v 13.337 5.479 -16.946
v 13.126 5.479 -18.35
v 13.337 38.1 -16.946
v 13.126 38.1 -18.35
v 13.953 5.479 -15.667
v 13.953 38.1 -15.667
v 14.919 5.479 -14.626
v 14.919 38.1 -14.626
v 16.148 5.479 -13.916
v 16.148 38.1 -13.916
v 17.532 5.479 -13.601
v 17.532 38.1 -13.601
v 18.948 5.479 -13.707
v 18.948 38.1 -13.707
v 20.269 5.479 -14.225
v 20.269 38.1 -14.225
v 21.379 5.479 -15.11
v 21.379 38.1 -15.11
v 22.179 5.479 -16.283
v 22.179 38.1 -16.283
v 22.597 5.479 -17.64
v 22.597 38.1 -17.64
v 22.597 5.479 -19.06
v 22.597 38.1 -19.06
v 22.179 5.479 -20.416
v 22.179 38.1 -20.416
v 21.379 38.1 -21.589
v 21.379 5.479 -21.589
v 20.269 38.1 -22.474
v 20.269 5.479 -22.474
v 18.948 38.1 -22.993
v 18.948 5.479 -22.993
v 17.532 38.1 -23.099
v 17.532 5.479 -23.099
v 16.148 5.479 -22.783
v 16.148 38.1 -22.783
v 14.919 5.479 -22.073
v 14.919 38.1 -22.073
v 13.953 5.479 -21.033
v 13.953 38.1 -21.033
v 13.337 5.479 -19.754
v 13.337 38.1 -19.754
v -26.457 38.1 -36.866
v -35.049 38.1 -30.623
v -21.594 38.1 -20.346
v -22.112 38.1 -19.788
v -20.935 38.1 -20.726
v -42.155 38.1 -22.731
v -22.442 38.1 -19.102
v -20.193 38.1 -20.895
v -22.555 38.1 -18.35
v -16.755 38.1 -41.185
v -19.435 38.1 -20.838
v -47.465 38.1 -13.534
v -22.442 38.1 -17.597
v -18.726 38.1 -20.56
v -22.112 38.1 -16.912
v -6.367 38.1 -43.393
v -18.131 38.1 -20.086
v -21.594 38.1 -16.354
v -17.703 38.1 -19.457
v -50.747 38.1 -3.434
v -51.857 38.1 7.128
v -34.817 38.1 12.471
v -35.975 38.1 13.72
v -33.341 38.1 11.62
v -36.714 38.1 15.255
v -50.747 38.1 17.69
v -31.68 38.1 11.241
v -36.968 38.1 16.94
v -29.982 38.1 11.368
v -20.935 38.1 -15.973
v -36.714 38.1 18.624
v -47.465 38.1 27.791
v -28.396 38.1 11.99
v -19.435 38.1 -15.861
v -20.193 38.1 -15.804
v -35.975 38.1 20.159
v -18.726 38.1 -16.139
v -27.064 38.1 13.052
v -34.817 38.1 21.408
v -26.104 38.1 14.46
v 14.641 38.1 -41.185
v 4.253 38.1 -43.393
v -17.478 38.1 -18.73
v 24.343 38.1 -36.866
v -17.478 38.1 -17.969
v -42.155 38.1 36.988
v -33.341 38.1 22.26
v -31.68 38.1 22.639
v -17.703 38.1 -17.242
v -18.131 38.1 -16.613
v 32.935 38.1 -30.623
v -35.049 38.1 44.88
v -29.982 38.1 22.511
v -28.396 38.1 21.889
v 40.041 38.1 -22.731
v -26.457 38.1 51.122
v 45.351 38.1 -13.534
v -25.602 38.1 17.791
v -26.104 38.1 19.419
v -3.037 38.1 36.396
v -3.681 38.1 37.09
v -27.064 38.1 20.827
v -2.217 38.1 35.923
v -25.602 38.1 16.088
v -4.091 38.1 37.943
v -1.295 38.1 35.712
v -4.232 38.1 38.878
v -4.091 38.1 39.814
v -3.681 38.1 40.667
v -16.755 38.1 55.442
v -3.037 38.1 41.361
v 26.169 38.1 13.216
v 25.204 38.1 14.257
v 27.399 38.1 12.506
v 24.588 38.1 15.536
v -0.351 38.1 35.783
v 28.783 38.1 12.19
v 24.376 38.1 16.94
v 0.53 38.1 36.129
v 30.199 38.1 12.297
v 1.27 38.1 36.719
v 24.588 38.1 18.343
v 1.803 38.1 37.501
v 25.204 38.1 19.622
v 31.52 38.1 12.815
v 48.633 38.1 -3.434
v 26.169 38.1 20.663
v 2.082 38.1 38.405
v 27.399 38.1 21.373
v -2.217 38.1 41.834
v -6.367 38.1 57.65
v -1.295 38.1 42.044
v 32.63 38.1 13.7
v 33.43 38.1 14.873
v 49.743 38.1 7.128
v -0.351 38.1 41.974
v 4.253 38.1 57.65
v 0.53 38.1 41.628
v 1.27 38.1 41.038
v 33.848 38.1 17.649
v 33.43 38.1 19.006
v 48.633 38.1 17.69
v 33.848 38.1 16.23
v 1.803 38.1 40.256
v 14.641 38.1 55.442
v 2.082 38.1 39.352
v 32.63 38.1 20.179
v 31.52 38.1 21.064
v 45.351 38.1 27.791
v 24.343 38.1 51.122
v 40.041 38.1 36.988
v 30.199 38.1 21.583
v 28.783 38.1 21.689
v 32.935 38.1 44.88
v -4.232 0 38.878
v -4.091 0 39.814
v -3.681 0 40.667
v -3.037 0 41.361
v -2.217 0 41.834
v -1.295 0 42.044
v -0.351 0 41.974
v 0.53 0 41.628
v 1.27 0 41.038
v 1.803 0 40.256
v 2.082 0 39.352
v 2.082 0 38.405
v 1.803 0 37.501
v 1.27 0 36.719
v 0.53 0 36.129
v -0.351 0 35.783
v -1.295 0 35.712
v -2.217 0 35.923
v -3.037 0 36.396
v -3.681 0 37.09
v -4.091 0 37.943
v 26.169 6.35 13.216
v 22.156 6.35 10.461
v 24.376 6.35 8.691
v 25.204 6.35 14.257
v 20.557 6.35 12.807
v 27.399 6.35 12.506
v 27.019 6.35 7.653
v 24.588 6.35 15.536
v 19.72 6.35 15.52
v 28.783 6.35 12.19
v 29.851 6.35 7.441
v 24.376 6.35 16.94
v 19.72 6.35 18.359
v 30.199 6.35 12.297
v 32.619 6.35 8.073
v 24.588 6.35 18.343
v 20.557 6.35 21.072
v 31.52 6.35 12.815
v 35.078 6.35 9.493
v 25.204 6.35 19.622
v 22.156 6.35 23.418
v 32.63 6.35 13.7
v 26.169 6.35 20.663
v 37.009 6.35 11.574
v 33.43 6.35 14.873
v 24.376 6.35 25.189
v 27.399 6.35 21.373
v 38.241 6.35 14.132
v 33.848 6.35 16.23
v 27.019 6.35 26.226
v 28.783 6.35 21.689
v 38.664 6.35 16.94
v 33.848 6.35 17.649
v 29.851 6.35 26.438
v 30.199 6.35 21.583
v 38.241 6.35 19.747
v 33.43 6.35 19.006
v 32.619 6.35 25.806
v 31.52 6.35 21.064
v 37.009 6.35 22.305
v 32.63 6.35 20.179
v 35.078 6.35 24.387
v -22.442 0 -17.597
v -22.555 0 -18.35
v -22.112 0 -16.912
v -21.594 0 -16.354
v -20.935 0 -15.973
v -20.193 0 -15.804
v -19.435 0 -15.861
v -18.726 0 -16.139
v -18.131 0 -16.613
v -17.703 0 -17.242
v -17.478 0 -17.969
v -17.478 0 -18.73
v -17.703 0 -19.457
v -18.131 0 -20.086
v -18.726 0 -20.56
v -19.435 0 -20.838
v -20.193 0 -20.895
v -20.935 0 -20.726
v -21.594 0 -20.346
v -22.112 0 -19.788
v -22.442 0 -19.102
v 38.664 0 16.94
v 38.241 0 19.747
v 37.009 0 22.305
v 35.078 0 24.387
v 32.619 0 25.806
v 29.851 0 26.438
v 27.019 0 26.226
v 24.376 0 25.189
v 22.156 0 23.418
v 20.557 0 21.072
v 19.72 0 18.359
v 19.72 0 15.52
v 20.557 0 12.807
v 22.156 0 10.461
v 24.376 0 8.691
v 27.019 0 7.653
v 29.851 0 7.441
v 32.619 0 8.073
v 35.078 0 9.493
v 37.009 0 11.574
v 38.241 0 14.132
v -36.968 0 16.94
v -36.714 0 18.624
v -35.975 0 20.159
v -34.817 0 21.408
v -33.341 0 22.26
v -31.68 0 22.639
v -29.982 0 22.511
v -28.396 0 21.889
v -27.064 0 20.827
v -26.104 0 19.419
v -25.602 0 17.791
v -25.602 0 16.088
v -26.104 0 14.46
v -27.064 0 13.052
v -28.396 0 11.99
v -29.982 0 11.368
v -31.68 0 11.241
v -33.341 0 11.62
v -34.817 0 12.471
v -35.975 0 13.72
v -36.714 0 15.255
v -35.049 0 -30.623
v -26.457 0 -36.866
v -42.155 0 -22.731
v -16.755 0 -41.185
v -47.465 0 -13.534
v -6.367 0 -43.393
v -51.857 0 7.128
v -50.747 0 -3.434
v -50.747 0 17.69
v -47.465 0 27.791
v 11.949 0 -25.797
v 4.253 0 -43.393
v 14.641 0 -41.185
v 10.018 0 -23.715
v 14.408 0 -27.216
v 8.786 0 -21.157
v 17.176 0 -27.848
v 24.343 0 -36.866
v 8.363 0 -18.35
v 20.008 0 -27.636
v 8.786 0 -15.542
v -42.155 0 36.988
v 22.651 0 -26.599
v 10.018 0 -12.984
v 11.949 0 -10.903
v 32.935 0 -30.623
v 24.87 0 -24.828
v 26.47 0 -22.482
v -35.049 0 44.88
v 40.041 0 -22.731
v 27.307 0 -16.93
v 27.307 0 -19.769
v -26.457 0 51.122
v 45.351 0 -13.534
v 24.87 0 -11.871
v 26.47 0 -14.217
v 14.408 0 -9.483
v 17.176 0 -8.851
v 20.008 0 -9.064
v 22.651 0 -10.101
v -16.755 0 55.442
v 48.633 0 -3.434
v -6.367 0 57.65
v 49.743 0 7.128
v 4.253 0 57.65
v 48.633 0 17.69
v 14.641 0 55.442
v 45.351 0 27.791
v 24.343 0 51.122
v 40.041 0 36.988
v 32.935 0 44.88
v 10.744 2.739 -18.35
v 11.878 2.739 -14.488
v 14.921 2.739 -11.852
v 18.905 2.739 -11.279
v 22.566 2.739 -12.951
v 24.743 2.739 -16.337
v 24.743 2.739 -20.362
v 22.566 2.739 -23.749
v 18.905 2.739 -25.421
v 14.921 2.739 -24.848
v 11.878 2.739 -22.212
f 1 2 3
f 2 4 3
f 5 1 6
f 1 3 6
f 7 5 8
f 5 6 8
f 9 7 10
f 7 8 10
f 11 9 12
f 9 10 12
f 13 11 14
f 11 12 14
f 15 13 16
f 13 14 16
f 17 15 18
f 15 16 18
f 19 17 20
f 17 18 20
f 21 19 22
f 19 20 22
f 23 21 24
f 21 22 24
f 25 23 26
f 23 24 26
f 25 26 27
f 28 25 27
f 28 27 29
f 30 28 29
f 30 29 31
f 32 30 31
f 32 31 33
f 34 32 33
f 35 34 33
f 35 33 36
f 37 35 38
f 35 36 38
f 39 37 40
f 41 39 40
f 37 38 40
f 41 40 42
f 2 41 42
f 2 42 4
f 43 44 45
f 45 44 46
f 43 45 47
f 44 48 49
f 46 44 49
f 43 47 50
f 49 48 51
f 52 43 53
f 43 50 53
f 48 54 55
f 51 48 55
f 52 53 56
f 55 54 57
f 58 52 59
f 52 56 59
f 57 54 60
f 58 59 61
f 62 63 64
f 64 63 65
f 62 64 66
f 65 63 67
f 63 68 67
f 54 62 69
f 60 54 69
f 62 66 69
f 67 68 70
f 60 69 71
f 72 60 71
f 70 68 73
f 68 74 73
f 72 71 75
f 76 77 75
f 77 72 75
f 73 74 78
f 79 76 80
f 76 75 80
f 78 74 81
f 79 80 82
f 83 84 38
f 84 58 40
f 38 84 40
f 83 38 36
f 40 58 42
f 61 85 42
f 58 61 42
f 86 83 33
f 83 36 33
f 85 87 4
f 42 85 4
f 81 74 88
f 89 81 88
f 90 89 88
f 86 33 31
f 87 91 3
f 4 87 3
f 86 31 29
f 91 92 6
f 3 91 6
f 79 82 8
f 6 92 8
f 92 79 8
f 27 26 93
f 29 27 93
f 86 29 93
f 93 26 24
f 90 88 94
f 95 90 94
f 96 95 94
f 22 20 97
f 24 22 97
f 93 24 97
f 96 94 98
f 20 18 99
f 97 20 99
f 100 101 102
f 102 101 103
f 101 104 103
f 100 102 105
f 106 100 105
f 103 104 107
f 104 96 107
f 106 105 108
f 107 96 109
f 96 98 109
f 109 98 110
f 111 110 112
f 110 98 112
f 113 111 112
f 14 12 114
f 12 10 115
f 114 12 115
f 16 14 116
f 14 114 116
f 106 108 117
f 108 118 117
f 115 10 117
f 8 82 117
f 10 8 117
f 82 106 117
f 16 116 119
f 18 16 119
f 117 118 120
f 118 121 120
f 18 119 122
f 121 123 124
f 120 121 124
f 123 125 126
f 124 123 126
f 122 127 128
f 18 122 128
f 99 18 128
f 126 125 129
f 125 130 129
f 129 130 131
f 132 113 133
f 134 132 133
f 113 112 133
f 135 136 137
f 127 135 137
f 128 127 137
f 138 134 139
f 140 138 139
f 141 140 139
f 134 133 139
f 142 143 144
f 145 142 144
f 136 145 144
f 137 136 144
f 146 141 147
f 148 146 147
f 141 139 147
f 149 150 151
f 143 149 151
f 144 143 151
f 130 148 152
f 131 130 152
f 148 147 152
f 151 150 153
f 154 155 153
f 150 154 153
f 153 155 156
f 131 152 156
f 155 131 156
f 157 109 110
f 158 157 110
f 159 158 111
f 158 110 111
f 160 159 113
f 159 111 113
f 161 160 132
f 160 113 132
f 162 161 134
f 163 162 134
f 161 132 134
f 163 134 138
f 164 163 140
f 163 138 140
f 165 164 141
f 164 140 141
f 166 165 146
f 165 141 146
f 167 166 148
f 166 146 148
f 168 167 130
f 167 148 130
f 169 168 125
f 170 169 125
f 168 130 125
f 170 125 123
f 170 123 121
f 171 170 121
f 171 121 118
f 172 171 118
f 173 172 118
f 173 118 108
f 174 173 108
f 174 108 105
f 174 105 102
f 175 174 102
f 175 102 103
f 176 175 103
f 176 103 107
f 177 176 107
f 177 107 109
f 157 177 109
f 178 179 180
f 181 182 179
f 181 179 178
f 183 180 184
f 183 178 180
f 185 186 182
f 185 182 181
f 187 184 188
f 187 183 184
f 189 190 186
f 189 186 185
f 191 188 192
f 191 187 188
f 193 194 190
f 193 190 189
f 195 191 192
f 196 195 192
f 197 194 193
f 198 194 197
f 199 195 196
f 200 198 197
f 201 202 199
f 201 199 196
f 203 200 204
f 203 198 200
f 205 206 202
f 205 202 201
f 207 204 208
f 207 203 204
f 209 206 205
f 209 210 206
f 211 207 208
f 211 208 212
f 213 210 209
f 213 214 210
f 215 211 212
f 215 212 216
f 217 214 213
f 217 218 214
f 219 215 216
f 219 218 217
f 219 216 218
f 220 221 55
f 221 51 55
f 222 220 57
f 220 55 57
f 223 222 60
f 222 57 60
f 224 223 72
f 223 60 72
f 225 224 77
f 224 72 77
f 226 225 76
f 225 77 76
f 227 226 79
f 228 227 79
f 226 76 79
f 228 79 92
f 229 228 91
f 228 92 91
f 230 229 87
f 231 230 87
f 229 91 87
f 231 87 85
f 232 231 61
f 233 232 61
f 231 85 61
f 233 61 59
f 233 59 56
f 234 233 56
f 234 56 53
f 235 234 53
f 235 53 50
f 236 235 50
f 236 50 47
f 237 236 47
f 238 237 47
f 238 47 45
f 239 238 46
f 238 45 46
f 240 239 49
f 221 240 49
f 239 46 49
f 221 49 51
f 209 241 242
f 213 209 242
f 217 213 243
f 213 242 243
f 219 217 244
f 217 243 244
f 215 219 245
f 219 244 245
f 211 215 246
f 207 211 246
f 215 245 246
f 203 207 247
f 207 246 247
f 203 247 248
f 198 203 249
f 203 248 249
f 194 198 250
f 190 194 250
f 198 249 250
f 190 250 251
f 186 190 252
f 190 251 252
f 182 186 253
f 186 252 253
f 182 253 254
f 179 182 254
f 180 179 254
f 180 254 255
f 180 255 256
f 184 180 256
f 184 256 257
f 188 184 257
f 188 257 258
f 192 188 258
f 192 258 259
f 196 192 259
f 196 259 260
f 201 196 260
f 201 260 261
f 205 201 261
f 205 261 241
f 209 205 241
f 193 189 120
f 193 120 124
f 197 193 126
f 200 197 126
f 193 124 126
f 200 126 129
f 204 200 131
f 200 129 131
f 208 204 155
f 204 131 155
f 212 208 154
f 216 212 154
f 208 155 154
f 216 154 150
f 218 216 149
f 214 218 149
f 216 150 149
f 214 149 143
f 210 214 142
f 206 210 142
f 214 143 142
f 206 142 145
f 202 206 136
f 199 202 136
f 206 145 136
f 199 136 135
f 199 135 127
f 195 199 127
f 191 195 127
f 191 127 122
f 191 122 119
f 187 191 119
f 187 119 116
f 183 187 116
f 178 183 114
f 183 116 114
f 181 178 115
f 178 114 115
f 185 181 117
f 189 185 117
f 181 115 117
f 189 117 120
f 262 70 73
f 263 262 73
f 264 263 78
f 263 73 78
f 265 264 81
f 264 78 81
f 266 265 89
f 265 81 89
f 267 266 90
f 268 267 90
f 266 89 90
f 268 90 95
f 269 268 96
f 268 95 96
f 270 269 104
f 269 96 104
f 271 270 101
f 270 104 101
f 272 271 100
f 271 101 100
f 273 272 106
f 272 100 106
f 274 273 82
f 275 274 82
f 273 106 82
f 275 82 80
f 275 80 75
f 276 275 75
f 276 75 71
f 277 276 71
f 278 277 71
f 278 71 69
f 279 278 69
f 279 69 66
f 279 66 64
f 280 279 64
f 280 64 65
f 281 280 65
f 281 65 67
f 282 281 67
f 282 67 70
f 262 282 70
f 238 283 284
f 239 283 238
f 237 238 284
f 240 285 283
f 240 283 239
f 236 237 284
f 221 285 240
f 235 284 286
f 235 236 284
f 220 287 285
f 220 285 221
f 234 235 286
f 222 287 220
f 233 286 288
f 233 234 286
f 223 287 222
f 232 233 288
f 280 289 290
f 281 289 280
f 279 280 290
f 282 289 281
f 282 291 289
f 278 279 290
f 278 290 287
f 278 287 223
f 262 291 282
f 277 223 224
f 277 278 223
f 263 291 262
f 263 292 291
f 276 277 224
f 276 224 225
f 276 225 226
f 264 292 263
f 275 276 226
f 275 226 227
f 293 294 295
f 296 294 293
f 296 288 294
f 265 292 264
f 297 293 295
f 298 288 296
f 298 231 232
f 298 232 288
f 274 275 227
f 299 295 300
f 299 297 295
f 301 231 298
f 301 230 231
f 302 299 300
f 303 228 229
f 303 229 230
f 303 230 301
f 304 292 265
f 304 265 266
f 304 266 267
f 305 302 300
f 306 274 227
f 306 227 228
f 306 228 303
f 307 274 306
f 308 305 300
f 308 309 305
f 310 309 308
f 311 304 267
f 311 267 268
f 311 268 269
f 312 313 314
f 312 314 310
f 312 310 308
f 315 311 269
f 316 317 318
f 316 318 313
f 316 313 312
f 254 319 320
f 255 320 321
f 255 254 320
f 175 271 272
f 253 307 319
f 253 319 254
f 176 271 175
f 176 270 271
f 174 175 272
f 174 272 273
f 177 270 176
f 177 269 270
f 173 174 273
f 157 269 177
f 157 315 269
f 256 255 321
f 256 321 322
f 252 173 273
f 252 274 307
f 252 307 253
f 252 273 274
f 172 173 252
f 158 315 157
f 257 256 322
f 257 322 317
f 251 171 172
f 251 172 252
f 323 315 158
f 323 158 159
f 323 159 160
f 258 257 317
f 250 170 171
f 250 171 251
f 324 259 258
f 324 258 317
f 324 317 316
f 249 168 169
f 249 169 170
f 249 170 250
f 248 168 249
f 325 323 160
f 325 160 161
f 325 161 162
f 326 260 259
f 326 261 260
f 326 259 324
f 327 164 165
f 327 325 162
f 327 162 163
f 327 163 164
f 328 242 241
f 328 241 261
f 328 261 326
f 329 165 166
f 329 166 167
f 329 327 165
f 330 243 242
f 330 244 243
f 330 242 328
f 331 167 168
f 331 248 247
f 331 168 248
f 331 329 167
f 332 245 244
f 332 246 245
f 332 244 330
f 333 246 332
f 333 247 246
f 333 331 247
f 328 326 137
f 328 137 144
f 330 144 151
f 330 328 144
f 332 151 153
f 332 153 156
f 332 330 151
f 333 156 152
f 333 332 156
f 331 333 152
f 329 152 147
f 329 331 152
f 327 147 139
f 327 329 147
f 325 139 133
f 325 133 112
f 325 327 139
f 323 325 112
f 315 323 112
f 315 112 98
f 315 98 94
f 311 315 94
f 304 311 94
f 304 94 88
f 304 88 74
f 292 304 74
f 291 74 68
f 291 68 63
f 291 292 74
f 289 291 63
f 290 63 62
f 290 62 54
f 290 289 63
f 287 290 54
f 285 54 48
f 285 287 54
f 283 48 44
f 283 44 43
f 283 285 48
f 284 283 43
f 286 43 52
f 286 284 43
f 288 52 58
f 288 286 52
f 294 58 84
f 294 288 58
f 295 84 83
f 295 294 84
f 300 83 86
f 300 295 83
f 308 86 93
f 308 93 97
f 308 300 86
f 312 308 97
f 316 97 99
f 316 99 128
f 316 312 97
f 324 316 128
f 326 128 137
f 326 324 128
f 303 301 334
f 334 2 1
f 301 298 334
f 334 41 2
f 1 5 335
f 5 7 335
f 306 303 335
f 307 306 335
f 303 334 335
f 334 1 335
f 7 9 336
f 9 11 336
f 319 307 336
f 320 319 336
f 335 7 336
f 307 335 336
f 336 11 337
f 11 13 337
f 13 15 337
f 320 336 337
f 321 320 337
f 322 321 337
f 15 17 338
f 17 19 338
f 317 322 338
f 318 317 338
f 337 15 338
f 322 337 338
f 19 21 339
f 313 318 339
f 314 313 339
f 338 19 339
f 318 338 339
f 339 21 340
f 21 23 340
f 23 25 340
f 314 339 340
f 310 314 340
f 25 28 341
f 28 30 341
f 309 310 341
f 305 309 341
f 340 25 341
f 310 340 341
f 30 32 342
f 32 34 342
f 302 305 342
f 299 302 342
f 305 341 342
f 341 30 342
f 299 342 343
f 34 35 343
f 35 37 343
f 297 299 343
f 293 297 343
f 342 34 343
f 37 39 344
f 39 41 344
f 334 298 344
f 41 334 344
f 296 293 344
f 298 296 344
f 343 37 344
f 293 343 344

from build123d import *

# Parameters (mm, degrees)
F0_R           = 50.8
F0_R_2         = 1.5875
F0_R_3         = 9.525
F0_R_4         = 5.715
F0_R_5         = 3.175
F0_R_6         = 4.7625
F1_DEPTH       = 38.1
F2_D           = 6.35
F3_D           = 9.525
F3_CBORE_D     = 19.05
F3_CBORE_DEPTH = 6.35
F4_D           = 9.525
F4_CSINK_D     = 19.05
F4_CSINK_ANGLE = 82
F5_D           = 5.1054
F5_DEPTH       = 38.1
F5_TIP         = 1.5338169022
F6_D           = 11.43


with BuildPart() as f1:
    # F0 (on Front) → F1 (new body)
    with BuildSketch(Plane.XZ):
        with Locations((-1.0572489118, 7.1283597499)):
            Circle(F0_R)
        with Locations((-20.0026774298, -18.3497335514)):
            Circle(F0_R_2, mode=Mode.SUBTRACT)
        with Locations((17.8881796061, -18.3497335514)):
            Circle(F0_R_3, mode=Mode.SUBTRACT)
        with Locations((-31.2532933042, 16.9396493213)):
            Circle(F0_R_4, mode=Mode.SUBTRACT)
        with Locations((-1.0572489118, 38.8783597499)):
            Circle(F0_R_5, mode=Mode.SUBTRACT)
        with Locations((29.1387954806, 16.9396493213)):
            Circle(F0_R_3, mode=Mode.SUBTRACT)
        with Locations((29.1387954806, 16.9396493213)):
            Circle(F0_R_3)
        with Locations((29.1387954806, 16.9396493213)):
            Circle(F0_R_6, mode=Mode.SUBTRACT)
        with Locations((17.8881796061, -18.3497335514)):
            Circle(F0_R_3)
        with Locations((17.8881796061, -18.3497335514)):
            Circle(F0_R_6, mode=Mode.SUBTRACT)
        with Locations((-31.2532933042, 16.9396493213)):
            Circle(F0_R_4)
        with Locations((29.1387954806, 16.9396493213)):
            Circle(F0_R_6)
        with Locations((17.8881796061, -18.3497335514)):
            Circle(F0_R_6)
        with Locations((-1.0572489118, 38.8783597499)):
            Circle(F0_R_5)
        with Locations((-20.0026774298, -18.3497335514)):
            Circle(F0_R_2)
    extrude(amount=-F1_DEPTH)

    # F2 (through all)
    with Locations(Plane.XZ):
        with Locations((-1.0572489118, 38.8783597499)):
            Hole(F2_D / 2)

    # F3 (through all)
    with Locations(Plane.XZ):
        with Locations((29.1387954806, 16.9396493213)):
            CounterBoreHole(F3_D / 2, F3_CBORE_D / 2, F3_CBORE_DEPTH)

    # F4 (through all)
    with Locations(Plane.XZ):
        with Locations((17.8881796061, -18.3497335514)):
            CounterSinkHole(F4_D / 2, F4_CSINK_D / 2, counter_sink_angle=F4_CSINK_ANGLE)

    # F5
    with Locations(Plane.XZ):
        with Locations((-20.0026774298, -18.3497335514)):
            Hole(F5_D / 2, depth=F5_DEPTH)
            with Locations((0, 0, -(F5_DEPTH + F5_TIP / 2))):  # 118° drill point
                Cone(0, F5_D / 2, F5_TIP, mode=Mode.SUBTRACT)

    # F6 (through all)
    with Locations(Plane.XZ):
        with Locations((-31.2532933042, 16.9396493213)):
            Hole(F6_D / 2)


solid = f1.part
